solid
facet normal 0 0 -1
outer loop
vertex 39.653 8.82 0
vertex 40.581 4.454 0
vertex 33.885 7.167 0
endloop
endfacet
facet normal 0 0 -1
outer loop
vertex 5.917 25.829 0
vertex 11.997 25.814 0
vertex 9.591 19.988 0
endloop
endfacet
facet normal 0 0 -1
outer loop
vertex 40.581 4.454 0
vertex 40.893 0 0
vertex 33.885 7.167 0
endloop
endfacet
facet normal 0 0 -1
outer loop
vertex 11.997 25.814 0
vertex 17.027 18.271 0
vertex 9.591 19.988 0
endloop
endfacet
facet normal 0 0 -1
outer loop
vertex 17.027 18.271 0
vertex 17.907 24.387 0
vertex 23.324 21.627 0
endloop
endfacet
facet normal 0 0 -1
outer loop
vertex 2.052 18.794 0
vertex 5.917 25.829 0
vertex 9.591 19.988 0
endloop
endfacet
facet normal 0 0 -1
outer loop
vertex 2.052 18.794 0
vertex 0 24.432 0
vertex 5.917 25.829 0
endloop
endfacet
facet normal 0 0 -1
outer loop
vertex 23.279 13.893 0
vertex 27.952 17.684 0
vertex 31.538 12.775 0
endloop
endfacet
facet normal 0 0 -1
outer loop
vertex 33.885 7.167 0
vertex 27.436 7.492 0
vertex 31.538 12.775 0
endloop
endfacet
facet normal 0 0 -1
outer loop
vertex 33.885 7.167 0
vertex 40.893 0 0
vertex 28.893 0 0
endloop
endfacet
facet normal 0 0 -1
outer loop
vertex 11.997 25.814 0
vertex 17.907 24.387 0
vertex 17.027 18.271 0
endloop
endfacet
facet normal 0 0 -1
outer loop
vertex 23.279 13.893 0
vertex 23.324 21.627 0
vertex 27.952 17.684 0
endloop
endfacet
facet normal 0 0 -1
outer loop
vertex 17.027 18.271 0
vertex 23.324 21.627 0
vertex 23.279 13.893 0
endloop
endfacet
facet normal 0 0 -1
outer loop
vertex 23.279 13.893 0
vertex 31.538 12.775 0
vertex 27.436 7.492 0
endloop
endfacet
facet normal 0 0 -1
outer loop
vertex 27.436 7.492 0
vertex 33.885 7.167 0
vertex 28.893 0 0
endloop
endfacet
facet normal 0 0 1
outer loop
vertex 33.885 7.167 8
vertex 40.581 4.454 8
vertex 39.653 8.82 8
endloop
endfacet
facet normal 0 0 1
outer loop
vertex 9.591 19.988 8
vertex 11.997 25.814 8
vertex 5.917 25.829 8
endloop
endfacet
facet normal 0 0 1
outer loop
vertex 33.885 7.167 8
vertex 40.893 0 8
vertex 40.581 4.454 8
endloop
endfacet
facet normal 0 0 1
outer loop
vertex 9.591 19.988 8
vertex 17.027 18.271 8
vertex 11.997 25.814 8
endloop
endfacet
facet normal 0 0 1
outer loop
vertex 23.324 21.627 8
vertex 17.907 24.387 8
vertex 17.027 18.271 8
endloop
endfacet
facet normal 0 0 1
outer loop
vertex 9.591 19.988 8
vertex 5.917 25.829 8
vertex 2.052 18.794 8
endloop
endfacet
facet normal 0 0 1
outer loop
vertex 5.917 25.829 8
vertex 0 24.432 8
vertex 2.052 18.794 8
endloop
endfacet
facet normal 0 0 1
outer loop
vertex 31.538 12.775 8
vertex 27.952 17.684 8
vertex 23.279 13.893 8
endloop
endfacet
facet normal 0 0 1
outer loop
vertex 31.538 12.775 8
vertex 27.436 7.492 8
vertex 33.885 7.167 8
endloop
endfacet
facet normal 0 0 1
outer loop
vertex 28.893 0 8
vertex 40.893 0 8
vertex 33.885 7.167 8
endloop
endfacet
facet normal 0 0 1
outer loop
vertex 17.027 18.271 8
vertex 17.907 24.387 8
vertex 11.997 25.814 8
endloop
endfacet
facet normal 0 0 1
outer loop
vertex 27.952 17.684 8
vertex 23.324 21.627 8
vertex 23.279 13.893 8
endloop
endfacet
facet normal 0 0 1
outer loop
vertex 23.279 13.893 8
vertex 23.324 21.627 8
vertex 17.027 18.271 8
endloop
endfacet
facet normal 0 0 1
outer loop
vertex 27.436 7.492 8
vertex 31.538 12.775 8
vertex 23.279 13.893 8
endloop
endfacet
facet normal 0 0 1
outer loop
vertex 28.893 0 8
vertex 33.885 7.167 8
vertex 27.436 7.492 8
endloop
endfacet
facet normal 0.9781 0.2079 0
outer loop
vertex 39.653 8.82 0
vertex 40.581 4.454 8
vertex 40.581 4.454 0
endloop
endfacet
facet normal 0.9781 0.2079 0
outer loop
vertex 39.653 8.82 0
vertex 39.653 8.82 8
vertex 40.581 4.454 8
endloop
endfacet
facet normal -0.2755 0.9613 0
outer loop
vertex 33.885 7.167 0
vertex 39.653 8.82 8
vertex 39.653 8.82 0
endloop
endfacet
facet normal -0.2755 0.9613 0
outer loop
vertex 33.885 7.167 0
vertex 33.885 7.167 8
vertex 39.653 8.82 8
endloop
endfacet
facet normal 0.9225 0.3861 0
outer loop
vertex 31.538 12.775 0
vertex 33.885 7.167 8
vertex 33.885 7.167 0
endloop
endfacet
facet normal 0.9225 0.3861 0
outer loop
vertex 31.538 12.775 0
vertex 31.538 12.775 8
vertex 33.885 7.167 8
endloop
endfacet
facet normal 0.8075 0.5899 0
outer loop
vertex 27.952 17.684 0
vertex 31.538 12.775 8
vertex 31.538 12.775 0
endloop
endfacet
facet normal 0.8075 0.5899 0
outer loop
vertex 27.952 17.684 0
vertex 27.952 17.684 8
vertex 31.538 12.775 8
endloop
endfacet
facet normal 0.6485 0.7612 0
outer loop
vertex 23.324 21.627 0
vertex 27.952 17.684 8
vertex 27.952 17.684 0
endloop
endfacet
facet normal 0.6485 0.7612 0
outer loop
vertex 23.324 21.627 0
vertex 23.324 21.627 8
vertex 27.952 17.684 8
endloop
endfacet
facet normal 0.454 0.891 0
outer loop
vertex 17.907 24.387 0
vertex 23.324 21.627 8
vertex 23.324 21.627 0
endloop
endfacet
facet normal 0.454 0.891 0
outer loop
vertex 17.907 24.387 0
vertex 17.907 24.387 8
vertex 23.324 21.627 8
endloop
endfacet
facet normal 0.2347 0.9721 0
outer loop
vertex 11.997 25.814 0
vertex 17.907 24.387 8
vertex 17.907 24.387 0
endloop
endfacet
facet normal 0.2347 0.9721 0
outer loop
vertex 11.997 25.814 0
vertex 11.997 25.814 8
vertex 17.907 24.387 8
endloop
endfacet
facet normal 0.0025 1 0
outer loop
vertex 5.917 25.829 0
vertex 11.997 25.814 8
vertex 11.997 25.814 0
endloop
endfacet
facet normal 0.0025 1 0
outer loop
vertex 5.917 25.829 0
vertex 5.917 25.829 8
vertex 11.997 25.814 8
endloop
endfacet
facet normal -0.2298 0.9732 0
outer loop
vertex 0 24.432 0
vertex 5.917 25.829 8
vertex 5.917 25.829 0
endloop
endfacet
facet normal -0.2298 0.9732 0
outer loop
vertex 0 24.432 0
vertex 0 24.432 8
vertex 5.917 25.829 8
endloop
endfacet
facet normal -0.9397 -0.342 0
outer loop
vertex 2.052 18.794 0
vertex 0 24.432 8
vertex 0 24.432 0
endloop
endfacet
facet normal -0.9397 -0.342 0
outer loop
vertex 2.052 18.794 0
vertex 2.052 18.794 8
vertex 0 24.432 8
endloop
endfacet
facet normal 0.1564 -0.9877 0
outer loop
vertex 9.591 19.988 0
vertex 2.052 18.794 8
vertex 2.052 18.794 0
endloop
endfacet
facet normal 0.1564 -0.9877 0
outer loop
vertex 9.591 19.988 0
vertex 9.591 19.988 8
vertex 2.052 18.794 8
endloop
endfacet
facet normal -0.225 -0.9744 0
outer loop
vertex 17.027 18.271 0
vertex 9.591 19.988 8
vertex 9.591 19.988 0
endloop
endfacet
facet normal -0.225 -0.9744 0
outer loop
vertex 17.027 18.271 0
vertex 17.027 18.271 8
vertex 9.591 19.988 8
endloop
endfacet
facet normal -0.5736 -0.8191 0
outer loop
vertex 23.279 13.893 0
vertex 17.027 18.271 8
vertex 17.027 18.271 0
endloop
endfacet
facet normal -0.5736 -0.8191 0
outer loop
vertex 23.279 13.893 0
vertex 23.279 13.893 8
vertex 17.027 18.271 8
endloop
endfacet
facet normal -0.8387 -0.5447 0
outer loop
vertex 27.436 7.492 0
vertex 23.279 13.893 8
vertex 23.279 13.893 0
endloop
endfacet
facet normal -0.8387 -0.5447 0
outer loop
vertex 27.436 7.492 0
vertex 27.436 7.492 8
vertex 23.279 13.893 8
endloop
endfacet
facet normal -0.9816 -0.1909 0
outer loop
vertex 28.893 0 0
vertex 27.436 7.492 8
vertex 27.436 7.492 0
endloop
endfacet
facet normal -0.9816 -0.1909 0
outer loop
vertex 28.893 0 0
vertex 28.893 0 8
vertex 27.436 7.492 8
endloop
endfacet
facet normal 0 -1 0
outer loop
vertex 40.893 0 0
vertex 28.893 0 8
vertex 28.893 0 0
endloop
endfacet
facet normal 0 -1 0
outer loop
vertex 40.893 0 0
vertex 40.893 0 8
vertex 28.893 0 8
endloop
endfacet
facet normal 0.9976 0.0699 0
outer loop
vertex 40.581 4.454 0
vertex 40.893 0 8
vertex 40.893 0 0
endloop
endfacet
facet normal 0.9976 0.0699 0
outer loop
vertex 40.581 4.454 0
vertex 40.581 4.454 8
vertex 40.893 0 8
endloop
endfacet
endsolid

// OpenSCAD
$fn = 32;

// ----------------------------------------------------------------------
// Arc stop: segment, 8 mm thick
// ----------------------------------------------------------------------

// --- parameters (mm) ---
profile_height = 8;       // extrusion height
profile_points = 17;      // points of the closed outline

profile = [[40.893, 0], [40.581, 4.454], [39.653, 8.82], [33.885, 7.167], [31.538, 12.775], [27.952, 17.684], [23.324, 21.627], [17.907, 24.387], [11.997, 25.814], [5.917, 25.829], [0, 24.432], [2.052, 18.794], [9.591, 19.988], [17.027, 18.271], [23.279, 13.893], [27.436, 7.492], [28.893, 0]];  // single closed polygon, 17 points, counter clockwise

// --- the one profile operation ---
linear_extrude(height = profile_height) polygon(points = profile);
